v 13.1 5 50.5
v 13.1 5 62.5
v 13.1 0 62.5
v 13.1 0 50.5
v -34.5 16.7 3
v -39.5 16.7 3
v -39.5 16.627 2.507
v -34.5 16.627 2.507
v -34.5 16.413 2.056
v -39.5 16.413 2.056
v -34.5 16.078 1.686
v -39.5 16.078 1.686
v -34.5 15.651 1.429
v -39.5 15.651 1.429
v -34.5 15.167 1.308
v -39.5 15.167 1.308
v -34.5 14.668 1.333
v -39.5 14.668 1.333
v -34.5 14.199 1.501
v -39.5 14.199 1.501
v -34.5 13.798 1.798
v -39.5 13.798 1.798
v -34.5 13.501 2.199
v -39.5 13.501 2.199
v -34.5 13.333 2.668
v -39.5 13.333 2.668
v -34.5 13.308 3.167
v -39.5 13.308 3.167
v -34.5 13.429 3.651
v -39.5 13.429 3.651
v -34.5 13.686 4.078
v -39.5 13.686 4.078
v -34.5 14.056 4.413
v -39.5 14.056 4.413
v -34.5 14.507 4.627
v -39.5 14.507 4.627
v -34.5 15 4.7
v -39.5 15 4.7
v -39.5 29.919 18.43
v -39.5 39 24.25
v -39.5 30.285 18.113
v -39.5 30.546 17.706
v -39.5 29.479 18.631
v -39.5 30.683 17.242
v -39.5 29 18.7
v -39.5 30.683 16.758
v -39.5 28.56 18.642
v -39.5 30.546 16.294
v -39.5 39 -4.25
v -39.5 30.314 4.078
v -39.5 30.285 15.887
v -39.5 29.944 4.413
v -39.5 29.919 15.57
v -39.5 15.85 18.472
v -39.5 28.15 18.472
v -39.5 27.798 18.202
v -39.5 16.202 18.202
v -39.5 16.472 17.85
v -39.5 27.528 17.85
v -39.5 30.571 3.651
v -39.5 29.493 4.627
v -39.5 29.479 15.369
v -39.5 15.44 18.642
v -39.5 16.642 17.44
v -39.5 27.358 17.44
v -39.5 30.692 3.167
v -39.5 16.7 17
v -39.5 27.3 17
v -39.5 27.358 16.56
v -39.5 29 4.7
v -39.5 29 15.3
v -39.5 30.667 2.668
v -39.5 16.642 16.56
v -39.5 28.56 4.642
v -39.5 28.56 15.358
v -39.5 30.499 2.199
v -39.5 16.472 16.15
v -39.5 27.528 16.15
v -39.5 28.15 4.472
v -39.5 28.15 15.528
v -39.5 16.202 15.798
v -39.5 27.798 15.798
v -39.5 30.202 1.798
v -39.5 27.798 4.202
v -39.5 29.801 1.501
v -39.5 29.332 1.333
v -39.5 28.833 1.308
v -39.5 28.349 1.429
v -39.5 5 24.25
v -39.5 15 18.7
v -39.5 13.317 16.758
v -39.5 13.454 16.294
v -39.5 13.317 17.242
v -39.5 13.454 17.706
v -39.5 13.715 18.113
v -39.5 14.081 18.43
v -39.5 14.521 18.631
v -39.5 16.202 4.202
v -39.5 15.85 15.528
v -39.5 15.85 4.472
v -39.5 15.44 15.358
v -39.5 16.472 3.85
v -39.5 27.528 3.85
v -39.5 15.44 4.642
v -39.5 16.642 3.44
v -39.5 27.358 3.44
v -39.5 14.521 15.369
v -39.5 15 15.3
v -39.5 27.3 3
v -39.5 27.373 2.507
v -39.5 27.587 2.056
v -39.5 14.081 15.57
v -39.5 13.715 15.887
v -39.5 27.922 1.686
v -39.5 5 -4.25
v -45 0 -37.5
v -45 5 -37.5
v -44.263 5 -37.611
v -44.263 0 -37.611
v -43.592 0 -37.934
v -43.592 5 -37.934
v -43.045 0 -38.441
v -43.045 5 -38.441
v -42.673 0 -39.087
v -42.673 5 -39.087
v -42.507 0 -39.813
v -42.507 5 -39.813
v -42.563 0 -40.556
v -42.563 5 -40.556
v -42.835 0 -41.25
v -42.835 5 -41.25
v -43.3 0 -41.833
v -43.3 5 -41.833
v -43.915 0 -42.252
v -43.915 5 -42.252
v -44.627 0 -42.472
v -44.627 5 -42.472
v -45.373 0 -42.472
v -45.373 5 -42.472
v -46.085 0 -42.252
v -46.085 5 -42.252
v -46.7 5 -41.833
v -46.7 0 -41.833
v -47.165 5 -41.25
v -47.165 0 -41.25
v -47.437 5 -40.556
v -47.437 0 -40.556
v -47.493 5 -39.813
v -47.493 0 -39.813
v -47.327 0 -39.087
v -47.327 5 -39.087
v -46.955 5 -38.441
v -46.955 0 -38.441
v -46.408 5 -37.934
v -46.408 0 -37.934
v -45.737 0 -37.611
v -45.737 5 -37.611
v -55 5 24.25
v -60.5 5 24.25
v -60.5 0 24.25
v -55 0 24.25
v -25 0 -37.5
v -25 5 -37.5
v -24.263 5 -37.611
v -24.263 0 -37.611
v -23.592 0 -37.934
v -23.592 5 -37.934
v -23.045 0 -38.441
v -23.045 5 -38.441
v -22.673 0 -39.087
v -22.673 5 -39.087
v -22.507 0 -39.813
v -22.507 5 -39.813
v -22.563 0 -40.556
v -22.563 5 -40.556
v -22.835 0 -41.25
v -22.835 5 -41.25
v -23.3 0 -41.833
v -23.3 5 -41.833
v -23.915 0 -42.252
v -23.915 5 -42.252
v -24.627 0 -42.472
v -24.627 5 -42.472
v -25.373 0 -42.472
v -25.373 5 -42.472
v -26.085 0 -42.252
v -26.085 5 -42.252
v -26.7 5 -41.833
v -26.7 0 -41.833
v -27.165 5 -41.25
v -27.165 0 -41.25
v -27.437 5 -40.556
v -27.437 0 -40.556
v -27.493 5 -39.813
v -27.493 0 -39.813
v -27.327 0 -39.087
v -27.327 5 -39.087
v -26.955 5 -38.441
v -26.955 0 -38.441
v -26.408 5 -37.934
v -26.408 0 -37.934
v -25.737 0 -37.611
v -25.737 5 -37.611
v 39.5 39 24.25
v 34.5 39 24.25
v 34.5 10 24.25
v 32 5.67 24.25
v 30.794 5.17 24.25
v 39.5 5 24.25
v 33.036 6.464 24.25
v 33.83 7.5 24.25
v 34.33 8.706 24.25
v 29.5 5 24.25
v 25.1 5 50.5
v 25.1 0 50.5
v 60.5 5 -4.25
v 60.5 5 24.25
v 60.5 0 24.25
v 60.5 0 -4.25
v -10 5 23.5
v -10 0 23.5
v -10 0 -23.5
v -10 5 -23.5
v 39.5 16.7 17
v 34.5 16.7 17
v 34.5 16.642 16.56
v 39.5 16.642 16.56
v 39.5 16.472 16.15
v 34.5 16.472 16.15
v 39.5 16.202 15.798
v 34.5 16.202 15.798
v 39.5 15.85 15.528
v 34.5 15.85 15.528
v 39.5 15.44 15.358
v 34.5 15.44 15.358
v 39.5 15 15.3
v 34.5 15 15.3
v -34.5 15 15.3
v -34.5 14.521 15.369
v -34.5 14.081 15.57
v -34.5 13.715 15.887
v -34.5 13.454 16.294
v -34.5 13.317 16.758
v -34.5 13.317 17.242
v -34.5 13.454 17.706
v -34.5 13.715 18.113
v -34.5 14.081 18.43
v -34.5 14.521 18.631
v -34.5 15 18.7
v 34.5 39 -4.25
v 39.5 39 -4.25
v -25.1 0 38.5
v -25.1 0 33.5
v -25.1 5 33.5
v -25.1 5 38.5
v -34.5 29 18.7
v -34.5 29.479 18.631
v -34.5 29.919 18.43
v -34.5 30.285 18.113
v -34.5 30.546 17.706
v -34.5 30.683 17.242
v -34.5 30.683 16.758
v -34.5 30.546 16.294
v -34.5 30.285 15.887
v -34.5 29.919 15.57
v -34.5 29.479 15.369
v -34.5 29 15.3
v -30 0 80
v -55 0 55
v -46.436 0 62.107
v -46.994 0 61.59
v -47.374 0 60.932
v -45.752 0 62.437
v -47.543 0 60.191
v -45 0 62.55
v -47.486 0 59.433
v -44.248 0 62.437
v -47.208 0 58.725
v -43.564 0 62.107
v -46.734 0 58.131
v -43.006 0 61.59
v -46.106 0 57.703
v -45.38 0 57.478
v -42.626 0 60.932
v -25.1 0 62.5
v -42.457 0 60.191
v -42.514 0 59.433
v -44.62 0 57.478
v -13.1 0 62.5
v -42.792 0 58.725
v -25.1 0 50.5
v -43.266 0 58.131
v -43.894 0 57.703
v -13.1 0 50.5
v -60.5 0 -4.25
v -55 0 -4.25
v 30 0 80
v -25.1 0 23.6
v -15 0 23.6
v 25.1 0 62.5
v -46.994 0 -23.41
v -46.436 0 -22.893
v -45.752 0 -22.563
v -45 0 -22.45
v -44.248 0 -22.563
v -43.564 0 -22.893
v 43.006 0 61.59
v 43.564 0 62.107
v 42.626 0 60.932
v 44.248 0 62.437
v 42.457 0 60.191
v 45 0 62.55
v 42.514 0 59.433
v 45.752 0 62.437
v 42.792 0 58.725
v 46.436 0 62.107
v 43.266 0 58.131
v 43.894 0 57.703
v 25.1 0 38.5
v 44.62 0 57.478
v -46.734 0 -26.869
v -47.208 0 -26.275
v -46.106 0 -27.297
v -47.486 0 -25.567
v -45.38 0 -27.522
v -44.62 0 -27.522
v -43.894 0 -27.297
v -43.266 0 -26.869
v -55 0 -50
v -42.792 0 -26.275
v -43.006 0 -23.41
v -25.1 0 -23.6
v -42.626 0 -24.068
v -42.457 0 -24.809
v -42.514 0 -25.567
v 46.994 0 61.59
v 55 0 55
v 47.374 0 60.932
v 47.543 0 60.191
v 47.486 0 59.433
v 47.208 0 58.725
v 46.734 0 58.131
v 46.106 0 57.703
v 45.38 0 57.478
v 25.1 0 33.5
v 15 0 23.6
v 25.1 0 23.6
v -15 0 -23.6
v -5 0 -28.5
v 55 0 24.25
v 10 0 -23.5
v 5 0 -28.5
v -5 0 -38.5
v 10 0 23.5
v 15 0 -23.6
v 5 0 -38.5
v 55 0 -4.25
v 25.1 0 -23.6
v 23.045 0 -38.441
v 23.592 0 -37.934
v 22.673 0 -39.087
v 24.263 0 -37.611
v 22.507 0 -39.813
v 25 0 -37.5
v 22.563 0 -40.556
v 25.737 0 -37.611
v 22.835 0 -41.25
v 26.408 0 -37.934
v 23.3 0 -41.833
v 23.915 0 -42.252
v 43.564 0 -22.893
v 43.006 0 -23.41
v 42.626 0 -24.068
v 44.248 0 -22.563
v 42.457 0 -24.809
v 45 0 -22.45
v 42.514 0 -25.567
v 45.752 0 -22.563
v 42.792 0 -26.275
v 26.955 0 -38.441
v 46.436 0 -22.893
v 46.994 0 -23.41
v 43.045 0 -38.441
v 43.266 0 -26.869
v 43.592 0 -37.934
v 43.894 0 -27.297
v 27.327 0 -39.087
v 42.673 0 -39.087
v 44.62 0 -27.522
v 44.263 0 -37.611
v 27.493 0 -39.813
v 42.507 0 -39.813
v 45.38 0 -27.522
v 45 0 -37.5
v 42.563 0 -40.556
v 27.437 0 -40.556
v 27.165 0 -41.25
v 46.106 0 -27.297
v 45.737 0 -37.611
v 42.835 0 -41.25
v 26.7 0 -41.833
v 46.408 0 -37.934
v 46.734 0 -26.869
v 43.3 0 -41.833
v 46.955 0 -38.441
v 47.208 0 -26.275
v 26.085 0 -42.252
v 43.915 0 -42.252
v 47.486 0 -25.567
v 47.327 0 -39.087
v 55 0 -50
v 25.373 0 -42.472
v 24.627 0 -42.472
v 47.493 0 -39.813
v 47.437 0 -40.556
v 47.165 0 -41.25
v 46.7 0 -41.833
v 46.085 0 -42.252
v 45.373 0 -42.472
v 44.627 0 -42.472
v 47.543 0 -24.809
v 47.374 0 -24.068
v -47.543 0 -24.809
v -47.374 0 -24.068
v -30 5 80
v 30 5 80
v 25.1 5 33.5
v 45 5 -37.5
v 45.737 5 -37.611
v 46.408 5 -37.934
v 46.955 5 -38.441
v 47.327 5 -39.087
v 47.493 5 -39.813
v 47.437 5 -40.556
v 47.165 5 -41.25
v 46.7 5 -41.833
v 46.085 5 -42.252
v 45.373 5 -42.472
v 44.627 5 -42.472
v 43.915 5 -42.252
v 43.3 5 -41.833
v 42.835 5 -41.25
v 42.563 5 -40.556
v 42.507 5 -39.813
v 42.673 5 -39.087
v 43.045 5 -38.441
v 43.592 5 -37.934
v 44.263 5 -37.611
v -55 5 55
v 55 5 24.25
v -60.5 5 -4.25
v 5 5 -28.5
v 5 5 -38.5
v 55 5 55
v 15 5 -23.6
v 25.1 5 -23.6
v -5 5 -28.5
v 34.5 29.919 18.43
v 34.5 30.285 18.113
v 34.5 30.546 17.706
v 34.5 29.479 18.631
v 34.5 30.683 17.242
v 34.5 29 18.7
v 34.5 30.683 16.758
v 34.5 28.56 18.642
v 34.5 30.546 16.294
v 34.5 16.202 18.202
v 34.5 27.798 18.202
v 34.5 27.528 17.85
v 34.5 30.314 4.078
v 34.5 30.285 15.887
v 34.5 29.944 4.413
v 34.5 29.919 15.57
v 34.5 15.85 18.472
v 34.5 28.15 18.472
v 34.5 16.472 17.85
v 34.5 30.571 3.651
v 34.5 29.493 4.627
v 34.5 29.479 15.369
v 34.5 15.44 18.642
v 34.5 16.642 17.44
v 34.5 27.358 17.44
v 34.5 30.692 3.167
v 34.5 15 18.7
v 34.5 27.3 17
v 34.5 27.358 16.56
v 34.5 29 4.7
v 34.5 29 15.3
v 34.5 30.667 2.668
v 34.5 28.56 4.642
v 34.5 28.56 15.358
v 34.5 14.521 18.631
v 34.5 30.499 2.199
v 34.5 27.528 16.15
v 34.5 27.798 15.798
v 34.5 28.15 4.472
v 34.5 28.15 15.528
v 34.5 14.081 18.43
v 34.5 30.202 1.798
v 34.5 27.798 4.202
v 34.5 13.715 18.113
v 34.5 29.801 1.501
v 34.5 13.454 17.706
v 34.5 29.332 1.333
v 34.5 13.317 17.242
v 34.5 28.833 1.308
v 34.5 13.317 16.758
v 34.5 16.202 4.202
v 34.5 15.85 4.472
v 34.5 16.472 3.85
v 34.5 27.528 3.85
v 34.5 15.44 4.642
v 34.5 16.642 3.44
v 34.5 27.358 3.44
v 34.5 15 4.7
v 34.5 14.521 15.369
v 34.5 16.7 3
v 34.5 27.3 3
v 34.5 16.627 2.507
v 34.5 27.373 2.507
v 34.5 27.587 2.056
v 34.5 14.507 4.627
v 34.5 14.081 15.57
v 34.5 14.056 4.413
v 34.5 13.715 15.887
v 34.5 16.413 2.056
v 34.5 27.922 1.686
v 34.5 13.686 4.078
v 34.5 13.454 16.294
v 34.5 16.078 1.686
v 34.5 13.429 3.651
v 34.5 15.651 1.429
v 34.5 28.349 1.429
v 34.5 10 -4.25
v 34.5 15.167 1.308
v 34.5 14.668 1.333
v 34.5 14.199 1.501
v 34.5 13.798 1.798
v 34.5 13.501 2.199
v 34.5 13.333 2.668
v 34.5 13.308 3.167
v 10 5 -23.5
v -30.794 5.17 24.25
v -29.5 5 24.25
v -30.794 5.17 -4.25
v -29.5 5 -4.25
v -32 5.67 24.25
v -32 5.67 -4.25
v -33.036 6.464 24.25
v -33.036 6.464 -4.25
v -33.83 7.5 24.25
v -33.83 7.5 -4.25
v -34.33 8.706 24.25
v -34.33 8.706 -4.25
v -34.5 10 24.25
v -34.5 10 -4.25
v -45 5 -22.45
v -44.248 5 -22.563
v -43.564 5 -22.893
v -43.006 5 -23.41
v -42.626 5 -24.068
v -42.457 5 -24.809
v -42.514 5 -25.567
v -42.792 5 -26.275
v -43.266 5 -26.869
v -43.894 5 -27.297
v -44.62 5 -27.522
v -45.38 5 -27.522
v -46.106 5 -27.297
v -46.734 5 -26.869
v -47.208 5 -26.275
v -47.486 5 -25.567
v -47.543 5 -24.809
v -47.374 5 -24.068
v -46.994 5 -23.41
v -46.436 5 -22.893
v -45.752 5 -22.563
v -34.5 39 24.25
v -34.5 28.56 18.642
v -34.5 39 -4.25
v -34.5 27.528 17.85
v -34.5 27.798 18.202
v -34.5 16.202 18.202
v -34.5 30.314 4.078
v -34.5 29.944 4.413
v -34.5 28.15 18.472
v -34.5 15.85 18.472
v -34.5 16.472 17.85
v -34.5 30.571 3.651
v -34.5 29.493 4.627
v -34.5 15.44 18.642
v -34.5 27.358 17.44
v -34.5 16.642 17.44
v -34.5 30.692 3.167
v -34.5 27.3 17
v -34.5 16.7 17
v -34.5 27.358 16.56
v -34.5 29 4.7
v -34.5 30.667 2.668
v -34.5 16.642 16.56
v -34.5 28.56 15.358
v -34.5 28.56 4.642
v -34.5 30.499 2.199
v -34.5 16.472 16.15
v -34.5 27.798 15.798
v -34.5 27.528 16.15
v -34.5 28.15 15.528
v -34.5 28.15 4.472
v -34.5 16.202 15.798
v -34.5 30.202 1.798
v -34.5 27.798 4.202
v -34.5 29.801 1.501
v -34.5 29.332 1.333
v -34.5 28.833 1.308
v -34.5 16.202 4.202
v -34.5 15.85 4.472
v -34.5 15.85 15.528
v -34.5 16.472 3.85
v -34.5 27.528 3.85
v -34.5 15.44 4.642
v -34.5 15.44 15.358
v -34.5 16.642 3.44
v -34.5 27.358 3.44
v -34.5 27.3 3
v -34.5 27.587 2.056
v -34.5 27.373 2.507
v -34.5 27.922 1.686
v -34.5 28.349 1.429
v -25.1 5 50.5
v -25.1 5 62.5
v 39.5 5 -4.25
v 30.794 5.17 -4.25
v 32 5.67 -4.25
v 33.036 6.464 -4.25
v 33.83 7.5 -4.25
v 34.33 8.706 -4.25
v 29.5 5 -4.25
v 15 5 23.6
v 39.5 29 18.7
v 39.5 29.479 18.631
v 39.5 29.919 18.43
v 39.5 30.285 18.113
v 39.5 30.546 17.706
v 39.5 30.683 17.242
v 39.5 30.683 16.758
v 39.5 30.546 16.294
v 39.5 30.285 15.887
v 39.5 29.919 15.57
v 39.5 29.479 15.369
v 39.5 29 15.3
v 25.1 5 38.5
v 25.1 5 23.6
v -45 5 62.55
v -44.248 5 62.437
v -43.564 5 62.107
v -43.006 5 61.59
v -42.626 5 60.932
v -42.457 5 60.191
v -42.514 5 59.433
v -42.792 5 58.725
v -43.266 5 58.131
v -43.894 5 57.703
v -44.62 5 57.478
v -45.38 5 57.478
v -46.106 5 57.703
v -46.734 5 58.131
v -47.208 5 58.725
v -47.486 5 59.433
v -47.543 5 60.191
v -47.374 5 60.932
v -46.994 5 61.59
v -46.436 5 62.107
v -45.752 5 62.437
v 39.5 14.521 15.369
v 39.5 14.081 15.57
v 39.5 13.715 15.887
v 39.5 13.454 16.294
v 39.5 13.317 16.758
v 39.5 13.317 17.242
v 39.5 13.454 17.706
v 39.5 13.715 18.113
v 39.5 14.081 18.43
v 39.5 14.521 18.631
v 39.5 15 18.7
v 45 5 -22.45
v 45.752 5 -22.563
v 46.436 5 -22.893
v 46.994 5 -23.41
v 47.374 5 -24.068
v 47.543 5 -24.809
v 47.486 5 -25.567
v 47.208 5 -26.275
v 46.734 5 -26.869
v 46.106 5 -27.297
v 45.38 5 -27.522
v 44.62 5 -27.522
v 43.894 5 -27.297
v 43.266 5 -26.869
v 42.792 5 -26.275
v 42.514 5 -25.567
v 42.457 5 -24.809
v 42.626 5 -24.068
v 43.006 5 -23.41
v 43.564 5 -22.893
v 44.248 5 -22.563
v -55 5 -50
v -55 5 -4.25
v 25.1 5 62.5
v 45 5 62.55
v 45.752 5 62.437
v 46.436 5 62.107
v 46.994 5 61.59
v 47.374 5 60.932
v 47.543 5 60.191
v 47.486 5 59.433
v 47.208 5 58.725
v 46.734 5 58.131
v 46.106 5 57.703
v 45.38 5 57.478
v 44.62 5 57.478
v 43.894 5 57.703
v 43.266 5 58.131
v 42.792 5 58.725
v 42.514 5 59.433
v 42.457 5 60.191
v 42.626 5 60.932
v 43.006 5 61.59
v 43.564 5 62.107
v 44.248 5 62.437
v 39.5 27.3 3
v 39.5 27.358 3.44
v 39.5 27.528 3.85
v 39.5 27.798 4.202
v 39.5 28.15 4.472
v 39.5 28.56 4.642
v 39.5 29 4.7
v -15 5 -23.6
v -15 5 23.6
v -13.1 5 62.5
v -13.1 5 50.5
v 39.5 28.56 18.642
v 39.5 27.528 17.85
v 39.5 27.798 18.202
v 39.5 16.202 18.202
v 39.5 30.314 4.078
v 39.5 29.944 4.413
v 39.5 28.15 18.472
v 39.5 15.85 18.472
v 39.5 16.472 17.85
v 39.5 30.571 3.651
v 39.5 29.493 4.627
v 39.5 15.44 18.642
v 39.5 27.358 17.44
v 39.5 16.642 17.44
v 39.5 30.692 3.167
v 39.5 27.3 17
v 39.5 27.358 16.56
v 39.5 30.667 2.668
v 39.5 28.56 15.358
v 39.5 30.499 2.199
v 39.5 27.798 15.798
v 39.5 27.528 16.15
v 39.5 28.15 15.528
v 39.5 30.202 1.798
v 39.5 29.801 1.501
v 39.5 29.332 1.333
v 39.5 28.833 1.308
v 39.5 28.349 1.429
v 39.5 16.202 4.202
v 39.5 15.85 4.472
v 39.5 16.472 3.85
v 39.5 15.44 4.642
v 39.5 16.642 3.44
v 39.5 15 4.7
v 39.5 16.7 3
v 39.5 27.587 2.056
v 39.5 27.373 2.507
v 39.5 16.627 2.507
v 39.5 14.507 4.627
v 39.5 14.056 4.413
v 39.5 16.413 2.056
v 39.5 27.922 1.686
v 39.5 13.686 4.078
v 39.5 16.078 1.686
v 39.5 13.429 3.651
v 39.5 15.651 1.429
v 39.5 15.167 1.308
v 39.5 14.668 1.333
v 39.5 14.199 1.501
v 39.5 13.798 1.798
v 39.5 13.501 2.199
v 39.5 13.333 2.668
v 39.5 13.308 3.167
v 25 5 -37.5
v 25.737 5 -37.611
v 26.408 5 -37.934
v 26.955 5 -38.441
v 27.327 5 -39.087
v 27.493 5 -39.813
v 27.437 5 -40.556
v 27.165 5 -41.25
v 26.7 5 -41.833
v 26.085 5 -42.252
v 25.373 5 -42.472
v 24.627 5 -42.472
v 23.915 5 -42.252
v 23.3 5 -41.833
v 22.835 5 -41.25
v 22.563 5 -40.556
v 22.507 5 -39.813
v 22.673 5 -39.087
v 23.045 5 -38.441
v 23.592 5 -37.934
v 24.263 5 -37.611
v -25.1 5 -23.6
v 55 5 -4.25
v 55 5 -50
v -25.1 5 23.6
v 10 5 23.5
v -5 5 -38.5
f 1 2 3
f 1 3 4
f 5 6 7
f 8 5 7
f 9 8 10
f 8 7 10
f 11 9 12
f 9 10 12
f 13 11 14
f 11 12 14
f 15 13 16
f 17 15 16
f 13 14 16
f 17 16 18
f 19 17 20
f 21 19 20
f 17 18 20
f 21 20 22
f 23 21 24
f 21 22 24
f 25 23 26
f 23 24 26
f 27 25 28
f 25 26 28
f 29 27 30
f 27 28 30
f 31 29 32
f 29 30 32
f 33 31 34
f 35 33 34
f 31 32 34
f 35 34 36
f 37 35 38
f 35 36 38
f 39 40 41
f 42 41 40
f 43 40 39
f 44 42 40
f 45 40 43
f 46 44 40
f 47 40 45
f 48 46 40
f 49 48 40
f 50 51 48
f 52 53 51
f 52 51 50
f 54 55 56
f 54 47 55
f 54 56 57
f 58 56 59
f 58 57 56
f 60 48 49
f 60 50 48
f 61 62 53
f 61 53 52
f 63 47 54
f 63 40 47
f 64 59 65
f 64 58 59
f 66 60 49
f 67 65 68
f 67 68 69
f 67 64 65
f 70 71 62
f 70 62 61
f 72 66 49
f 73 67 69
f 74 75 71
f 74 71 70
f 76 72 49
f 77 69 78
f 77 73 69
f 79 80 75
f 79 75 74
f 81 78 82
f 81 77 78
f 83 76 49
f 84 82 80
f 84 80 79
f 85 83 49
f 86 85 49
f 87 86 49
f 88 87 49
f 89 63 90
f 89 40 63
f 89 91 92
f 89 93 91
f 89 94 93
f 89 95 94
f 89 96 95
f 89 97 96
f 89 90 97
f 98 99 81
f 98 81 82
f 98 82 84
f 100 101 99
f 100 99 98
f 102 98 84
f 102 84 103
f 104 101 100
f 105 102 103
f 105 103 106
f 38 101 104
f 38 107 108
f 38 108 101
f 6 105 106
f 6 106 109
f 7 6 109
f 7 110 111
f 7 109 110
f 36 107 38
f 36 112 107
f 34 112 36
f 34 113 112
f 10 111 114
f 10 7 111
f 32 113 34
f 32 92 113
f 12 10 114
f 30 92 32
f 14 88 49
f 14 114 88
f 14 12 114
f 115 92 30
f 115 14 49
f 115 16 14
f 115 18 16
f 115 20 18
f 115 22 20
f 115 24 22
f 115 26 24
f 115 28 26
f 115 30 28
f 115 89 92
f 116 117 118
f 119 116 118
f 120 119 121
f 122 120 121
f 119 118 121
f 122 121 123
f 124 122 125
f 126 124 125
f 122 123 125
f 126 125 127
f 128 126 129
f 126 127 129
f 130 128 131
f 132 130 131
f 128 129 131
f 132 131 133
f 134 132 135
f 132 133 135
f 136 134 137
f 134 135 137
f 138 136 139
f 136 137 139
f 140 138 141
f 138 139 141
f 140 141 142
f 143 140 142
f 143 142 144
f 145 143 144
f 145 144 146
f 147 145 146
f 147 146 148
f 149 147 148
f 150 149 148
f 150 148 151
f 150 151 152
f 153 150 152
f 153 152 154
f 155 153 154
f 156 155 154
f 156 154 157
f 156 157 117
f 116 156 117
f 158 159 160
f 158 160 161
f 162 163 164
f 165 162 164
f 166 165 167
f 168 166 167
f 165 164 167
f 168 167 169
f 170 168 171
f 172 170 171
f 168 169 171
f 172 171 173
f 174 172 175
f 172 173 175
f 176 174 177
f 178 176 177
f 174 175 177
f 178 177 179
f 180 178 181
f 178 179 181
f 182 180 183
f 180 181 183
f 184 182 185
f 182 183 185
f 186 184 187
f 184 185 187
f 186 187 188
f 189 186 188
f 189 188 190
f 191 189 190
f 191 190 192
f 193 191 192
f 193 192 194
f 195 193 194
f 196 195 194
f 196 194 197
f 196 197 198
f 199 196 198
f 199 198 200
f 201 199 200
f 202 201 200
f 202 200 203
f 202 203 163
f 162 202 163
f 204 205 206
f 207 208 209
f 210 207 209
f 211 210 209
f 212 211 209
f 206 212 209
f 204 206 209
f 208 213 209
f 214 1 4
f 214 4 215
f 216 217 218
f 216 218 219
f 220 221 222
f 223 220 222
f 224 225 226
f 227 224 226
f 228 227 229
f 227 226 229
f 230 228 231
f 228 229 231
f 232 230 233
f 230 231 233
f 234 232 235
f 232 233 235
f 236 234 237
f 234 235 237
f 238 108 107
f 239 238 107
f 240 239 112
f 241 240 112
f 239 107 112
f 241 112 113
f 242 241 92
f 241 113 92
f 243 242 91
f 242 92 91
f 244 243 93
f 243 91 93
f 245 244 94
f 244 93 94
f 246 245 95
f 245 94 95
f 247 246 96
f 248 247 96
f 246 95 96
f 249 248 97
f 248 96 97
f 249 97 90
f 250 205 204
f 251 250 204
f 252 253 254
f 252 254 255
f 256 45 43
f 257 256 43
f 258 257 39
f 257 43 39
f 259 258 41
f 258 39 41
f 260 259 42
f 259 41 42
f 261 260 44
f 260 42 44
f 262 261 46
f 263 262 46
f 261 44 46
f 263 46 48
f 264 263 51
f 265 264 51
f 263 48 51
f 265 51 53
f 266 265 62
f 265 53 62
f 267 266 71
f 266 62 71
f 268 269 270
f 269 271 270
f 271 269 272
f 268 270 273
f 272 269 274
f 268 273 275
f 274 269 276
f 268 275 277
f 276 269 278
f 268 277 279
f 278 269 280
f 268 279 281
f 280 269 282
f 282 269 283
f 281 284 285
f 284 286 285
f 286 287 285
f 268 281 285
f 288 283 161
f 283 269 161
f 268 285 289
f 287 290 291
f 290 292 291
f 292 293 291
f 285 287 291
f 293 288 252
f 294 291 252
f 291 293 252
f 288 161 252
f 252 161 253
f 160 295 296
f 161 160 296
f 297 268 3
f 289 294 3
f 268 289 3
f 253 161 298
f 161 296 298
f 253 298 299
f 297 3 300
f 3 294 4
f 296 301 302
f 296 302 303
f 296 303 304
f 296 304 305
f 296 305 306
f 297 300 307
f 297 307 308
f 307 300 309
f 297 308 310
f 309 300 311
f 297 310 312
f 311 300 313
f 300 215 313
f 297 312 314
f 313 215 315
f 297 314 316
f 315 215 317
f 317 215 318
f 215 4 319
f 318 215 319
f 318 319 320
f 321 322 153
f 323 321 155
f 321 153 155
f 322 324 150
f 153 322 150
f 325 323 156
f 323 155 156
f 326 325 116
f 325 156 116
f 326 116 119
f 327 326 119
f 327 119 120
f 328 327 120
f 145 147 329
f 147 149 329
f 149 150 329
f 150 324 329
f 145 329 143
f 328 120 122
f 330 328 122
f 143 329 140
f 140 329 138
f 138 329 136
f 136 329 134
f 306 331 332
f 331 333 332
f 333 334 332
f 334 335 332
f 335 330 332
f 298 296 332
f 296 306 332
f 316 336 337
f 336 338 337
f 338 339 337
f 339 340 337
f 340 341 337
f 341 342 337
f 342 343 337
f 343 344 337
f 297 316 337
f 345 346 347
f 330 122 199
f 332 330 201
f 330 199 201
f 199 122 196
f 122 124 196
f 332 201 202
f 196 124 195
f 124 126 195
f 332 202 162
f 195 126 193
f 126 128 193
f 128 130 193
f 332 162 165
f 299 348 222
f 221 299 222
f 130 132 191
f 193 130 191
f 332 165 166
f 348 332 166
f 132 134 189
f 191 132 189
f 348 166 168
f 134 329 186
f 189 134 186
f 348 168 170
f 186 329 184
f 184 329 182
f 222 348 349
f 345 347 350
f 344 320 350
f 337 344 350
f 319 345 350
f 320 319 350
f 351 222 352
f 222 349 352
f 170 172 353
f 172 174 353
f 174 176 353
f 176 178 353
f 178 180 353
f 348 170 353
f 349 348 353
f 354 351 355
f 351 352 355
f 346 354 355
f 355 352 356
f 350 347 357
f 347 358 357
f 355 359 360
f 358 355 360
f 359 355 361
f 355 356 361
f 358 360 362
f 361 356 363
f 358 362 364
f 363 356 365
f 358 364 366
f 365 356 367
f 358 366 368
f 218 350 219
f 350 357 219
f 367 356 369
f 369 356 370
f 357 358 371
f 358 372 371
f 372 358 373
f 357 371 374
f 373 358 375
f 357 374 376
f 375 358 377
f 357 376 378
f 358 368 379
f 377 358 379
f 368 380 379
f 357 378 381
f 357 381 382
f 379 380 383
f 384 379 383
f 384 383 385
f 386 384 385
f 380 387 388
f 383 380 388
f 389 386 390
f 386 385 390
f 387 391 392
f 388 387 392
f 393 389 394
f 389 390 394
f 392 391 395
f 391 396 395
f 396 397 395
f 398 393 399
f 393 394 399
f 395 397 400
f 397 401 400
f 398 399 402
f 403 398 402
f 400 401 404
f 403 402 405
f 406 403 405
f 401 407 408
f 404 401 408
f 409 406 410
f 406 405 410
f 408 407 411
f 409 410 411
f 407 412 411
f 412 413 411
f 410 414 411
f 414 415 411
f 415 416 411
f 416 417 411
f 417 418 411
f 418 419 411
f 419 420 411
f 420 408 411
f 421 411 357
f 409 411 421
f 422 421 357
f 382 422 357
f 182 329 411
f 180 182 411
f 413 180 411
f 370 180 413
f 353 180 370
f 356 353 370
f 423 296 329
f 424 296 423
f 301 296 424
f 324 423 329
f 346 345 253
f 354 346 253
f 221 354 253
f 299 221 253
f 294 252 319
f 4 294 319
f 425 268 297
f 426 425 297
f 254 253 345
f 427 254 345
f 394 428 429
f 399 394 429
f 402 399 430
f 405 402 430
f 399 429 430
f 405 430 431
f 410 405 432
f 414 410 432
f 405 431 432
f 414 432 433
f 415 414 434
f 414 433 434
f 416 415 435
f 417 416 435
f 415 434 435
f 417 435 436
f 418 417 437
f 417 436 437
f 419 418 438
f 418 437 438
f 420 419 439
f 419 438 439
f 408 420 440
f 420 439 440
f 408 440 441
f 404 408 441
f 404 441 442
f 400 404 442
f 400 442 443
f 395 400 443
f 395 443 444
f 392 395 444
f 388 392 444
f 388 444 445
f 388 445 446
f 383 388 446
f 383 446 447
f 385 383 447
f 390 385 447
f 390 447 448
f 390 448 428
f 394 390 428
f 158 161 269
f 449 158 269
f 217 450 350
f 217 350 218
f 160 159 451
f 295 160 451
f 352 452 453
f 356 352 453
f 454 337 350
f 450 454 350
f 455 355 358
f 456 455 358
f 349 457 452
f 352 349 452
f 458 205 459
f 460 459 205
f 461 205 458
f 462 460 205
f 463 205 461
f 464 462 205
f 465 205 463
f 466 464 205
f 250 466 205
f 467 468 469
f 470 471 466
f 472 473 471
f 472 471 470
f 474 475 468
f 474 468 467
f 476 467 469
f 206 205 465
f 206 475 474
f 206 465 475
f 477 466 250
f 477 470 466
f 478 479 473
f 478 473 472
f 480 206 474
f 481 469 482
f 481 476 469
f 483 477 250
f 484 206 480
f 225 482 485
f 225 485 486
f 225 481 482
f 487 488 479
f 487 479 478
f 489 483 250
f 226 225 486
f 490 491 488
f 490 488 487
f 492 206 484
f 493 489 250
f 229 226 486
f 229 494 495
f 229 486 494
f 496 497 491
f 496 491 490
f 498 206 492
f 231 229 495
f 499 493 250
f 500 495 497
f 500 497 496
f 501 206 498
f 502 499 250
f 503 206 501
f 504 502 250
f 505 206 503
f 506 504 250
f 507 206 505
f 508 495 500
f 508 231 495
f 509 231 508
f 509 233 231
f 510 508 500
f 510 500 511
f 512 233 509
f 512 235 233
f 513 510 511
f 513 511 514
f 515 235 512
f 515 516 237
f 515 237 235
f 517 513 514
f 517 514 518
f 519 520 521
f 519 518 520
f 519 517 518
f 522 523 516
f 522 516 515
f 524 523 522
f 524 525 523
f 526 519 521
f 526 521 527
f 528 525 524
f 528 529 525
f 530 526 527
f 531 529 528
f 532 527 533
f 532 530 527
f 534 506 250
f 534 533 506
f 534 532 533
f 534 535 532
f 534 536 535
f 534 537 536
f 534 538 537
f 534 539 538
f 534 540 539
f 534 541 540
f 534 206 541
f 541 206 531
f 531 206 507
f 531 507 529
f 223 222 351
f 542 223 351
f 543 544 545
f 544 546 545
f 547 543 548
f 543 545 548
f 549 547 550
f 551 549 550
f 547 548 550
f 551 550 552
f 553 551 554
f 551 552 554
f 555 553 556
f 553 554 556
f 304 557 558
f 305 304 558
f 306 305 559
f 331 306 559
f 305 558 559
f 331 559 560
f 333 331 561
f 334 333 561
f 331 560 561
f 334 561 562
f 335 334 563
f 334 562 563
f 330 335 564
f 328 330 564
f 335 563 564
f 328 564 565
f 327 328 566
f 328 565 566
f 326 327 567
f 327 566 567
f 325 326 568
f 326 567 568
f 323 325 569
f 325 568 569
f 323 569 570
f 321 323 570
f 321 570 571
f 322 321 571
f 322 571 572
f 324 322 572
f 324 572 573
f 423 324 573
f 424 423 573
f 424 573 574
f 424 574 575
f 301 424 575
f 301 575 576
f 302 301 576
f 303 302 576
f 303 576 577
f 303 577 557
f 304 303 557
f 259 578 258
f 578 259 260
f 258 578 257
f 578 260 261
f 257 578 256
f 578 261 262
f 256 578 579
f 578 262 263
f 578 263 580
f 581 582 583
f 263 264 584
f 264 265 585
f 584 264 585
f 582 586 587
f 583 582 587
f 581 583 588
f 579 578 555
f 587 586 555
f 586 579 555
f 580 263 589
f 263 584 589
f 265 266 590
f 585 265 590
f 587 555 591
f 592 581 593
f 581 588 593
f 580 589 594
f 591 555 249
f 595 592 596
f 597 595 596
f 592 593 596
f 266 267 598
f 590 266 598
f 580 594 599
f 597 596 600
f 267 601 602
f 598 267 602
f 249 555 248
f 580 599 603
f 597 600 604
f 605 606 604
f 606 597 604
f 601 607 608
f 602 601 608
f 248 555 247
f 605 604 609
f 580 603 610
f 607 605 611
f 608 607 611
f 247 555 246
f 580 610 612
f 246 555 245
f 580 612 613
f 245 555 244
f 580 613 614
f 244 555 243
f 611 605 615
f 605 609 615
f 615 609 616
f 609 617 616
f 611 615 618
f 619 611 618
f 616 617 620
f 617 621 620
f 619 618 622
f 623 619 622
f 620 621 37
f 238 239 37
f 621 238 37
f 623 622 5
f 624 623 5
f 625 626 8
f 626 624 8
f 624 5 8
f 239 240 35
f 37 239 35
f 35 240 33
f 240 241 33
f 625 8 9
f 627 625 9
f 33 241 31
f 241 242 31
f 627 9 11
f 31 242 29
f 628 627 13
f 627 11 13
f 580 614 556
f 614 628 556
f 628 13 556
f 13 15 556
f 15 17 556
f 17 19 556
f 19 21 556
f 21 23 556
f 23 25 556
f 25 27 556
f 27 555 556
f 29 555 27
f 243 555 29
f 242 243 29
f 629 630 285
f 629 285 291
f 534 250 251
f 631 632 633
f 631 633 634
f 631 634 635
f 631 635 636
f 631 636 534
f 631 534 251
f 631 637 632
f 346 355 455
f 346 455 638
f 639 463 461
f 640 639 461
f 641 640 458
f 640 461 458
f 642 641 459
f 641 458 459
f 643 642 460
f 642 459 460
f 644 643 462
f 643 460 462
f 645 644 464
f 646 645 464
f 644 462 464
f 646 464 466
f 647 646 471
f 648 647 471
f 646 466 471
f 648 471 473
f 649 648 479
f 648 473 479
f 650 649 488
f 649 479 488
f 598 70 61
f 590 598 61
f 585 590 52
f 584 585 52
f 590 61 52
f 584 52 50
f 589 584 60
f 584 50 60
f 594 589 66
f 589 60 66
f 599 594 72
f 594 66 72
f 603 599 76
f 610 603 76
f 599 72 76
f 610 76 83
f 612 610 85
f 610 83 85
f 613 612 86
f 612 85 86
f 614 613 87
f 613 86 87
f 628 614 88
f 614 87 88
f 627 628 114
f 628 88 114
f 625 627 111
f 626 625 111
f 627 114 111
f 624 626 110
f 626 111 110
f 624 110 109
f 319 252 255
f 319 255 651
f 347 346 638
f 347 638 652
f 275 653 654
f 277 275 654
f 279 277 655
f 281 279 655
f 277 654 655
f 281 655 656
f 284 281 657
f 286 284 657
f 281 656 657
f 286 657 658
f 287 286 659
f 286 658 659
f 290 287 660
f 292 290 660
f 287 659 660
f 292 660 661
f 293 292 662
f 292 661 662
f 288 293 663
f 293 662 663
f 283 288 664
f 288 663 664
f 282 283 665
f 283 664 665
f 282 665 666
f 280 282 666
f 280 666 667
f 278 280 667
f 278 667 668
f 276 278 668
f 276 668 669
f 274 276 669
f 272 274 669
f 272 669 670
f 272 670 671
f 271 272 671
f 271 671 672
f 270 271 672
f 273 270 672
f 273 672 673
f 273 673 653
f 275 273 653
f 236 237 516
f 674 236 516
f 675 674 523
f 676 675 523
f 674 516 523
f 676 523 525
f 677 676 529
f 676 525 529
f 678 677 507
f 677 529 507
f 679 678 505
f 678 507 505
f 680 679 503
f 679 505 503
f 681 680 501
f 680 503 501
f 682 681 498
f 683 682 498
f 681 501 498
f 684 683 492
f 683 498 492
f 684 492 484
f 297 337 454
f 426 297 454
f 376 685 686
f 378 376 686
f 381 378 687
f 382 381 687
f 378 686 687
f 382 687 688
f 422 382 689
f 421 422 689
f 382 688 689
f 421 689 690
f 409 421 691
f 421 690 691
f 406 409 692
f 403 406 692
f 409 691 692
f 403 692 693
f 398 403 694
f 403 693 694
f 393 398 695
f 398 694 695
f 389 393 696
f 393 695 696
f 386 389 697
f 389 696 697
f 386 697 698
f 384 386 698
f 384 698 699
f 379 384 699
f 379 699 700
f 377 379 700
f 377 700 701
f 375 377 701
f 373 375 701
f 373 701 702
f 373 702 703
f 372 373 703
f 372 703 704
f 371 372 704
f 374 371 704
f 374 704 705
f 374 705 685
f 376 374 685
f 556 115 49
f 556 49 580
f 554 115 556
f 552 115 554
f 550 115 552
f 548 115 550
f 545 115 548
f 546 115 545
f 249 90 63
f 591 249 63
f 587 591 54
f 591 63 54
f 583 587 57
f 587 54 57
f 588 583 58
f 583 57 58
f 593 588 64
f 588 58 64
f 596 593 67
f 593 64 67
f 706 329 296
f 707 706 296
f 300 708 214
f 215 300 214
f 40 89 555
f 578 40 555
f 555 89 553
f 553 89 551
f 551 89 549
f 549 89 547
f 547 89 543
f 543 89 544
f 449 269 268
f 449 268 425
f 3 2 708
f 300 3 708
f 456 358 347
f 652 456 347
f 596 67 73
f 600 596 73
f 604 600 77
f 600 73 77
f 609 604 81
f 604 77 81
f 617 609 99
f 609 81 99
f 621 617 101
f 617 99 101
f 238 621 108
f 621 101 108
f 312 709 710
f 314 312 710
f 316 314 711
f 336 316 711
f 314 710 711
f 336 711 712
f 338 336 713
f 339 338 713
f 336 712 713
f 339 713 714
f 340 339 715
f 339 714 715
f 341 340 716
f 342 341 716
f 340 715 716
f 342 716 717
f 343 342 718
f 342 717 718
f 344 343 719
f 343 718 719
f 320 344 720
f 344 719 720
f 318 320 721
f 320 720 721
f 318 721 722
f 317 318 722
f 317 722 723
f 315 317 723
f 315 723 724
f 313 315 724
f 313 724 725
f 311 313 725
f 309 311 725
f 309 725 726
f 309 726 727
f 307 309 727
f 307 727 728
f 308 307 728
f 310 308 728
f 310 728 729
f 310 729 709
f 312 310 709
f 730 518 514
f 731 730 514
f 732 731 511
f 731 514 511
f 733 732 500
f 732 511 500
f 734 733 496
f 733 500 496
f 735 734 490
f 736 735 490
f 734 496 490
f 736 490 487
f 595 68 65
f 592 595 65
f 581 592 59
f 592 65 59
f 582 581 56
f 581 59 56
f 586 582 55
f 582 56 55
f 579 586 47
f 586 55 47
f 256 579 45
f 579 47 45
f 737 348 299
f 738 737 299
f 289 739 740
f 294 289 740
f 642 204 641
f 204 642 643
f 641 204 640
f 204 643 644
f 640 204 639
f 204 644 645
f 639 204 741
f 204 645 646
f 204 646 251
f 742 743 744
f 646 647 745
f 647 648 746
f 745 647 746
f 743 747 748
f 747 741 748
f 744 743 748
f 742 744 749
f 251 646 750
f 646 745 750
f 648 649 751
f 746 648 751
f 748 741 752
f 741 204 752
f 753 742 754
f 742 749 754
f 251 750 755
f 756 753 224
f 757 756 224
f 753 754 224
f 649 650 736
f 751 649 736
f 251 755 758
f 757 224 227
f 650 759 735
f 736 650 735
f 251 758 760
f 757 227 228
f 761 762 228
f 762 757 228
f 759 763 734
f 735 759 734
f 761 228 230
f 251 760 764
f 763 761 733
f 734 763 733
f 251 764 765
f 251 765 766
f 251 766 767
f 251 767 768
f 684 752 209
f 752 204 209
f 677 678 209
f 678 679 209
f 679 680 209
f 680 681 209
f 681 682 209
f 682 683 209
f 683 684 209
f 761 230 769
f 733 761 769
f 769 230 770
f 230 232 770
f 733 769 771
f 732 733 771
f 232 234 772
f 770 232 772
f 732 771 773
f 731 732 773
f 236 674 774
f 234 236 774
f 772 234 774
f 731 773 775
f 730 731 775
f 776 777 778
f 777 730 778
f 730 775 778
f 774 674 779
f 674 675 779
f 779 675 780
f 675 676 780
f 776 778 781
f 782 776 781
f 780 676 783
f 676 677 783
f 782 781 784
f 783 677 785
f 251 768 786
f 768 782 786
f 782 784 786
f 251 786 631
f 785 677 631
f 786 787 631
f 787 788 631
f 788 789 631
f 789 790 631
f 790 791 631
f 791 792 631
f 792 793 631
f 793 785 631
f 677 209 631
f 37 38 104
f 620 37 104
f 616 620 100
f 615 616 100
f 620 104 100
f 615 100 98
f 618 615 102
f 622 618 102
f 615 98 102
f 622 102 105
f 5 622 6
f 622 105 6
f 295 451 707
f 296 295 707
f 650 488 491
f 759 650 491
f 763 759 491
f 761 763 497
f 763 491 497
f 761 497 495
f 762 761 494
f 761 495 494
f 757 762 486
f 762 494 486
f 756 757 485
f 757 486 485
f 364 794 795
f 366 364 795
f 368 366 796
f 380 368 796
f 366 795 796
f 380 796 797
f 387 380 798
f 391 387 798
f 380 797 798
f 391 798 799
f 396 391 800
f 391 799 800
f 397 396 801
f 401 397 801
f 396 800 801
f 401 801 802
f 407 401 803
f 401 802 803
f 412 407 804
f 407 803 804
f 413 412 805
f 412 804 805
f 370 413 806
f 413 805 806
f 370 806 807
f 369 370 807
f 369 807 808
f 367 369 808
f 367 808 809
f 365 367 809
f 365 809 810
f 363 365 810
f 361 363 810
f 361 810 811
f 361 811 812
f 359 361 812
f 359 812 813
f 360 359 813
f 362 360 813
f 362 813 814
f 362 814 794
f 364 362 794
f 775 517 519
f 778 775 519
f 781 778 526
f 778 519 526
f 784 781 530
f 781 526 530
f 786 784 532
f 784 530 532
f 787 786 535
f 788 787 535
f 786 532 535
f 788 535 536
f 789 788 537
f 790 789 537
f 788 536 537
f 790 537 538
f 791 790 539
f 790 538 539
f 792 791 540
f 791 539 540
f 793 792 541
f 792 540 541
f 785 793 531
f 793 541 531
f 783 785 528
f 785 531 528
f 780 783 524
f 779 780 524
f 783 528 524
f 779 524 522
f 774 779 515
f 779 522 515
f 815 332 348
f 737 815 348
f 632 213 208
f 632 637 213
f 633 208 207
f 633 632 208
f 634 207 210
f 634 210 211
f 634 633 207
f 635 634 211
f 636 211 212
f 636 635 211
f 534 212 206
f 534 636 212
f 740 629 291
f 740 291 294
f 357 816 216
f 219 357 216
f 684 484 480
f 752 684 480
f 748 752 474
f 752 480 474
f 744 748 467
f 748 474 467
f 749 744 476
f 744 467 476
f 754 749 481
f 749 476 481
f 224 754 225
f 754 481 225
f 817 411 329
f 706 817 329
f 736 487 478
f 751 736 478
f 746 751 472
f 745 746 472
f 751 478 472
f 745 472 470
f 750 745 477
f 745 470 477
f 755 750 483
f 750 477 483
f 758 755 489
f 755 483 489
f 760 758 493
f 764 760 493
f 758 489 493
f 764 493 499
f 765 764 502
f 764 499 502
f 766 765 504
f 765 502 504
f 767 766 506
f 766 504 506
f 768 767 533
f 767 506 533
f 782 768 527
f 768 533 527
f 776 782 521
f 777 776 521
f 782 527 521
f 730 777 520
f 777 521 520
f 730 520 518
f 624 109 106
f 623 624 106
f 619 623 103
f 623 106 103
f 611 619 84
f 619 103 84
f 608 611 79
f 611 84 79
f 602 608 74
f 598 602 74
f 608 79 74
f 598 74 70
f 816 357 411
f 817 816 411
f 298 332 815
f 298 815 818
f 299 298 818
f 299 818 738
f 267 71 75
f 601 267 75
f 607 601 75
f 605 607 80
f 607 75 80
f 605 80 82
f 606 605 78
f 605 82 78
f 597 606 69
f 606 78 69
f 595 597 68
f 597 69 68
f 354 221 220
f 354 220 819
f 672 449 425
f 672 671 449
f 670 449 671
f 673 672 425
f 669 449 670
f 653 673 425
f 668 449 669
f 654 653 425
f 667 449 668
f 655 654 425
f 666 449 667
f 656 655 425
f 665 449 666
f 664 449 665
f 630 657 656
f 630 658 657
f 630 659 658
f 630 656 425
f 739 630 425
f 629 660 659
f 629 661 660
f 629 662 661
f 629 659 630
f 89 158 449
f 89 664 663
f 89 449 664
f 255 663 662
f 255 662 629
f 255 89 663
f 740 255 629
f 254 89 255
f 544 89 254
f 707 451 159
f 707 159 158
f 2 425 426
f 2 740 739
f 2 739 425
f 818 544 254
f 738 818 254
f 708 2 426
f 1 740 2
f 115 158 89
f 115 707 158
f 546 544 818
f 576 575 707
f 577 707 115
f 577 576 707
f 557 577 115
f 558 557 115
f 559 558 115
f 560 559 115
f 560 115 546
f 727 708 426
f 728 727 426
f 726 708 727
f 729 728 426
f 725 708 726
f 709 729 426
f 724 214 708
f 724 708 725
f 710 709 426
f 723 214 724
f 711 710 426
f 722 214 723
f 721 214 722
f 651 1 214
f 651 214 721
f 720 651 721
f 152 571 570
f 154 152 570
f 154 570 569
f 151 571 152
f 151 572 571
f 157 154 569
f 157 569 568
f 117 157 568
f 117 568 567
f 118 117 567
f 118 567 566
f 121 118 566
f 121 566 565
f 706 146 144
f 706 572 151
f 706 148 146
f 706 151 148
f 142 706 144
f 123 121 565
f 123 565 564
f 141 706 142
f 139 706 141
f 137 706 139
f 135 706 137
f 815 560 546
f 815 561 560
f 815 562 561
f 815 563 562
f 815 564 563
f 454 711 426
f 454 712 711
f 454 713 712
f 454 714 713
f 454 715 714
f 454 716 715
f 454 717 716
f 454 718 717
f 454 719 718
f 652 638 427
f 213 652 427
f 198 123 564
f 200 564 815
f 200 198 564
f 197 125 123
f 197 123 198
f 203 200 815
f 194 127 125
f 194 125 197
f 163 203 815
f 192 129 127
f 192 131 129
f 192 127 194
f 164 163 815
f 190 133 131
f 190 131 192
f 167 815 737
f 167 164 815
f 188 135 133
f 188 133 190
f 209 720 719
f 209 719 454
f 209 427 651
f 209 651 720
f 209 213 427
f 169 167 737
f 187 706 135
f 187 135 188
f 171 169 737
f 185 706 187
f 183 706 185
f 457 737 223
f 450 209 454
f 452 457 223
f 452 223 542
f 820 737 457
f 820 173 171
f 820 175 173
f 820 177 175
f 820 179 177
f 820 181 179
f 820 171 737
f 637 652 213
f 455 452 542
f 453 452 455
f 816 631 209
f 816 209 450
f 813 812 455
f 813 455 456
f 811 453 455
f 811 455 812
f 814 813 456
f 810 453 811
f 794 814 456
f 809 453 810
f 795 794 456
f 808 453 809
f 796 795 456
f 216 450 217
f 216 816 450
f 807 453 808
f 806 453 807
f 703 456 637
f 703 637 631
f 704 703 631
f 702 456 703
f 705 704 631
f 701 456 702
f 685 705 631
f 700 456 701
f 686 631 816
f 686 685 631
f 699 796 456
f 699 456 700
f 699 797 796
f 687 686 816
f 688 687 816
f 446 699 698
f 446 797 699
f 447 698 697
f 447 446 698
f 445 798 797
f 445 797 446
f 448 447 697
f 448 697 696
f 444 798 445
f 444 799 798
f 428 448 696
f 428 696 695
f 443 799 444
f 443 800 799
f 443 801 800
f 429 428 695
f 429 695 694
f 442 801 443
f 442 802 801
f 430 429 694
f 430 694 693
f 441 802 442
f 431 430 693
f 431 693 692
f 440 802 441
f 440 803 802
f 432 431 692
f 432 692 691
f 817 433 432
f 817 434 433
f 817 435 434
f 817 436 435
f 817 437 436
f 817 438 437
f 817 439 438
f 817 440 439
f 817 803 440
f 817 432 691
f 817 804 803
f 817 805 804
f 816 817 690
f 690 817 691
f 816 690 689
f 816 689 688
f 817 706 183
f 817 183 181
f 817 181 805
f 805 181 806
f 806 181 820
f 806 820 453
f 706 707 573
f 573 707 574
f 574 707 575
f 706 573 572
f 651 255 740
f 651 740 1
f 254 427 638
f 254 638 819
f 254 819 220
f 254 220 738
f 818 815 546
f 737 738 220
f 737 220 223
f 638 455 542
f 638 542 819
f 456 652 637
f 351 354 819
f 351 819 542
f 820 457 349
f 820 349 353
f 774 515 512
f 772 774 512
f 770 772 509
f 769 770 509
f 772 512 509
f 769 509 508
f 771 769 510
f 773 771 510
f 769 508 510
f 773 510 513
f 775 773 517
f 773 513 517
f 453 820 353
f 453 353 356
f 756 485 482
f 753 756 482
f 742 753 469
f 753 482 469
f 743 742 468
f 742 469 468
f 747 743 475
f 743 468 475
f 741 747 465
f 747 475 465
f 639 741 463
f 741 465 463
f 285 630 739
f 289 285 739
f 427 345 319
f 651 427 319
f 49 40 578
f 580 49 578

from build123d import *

# Parameters (mm, degrees)
SKETCH1_W           = 20
SKETCH1_H           = 47
BOSS_EXTRUDE3_DEPTH = 5
SKETCH2_W           = 10.1
SKETCH2_H           = 47.2
SKETCH2_W_2         = 50.2
SKETCH2_H_2         = 5
CUT_EXTRUDE1_DEPTH  = 15
SKETCH3_R           = 2.55
CUT_EXTRUDE3_DEPTH  = 10
SKETCH4_W           = 5
SKETCH4_H           = 28.5
BOSS_EXTRUDE4_DEPTH = 34
CUT_EXTRUDE4_DEPTH  = 130.812364588
FILLET1_R           = 5
SKETCH6_W           = 5.5
SKETCH6_H           = 28.5
BOSS_EXTRUDE5_DEPTH = 5
SKETCH9_R           = 2.5
CUT_EXTRUDE7_DEPTH  = 180
CHAMFER1_SIZE       = 25
SKETCH10_W          = 10
SKETCH10_H          = 10
SKETCH10_W_2        = 12
SKETCH10_H_2        = 12
CUT_EXTRUDE8_DEPTH  = 106.906798649


with BuildPart() as part:
    # Sketch1 → Boss-Extrude3 (new body)
    with BuildSketch(Plane(origin=(0, 0, 0), x_dir=(1, 0, 0), z_dir=(0, 1, 0))):
        Polygon((55, 50), (-55, 50), (-55, 21.75), (-55, -21.75), (-55, -80), (-20, -80), (2.5, -80), (20, -80), (42.5, -80), (55, -80), (55, -21.75), (55, 21.75), align=None)
        Rectangle(SKETCH1_W, SKETCH1_H, mode=Mode.SUBTRACT)
    extrude(amount=BOSS_EXTRUDE3_DEPTH)

    # Sketch2 → Cut-Extrude1 (cut)
    with BuildSketch(Plane.XZ):
        with Locations((-20.05, 0)):
            Rectangle(SKETCH2_W, SKETCH2_H)
        with Locations((20.05, 0)):
            Rectangle(SKETCH2_W, SKETCH2_H)
        with Locations((0, 36)):
            Rectangle(SKETCH2_W_2, SKETCH2_H_2)
    extrude(amount=-CUT_EXTRUDE1_DEPTH, mode=Mode.SUBTRACT)

    # Sketch3 → Cut-Extrude3 (cut)
    with BuildSketch(Plane(origin=(0, 5, 0), x_dir=(1, 0, 0), z_dir=(0, 1, 0))):
        with Locations(Location((-45, 25, 0), (0, 0, 270))):
            Circle(SKETCH3_R)
        with Locations(Location((-45, -60, 0), (0, 0, 270))):
            Circle(SKETCH3_R)
        with Locations(Location((45, -60, 0), (0, 0, 270))):
            Circle(SKETCH3_R)
        with Locations(Location((45, 25, 0), (0, 0, 270))):
            Circle(SKETCH3_R)
    extrude(amount=-CUT_EXTRUDE3_DEPTH, mode=Mode.SUBTRACT)

    # Sketch4 → Boss-Extrude4 (add)
    with BuildSketch(Plane(origin=(0, 5, 0), x_dir=(1, 0, 0), z_dir=(0, 1, 0))):
        with Locations((-37, -10)):
            Rectangle(SKETCH4_W, SKETCH4_H)
        with Locations((37, -10)):
            Rectangle(SKETCH4_W, SKETCH4_H)
    extrude(amount=BOSS_EXTRUDE4_DEPTH)

    # Sketch5 → Cut-Extrude4 (cut, through all)
    with BuildSketch(Plane.ZY.offset(39.5)):
        with BuildLine():
            ThreePointArc((4.7, 15), (4.202081528, 16.202081528), (3, 16.7))
            Line((3, 16.7), (3, 15))
            Line((3, 15), (4.7, 15))
        make_face()
        with BuildLine():
            Line((3, 15), (3, 16.7))
            ThreePointArc((3, 16.7), (1.797918472, 13.797918472), (4.7, 15))
            Line((4.7, 15), (3, 15))
        make_face()
        with BuildLine():
            Line((3, 27.3), (3, 29))
            Line((3, 29), (4.7, 29))
            ThreePointArc((4.7, 29), (1.797918472, 30.202081528), (3, 27.3))
        make_face()
        with BuildLine():
            Line((4.7, 29), (3, 29))
            Line((3, 29), (3, 27.3))
            ThreePointArc((3, 27.3), (4.202081528, 27.797918472), (4.7, 29))
        make_face()
        with BuildLine():
            ThreePointArc((18.7, 29), (17, 30.7), (15.3, 29))
            Line((15.3, 29), (17, 29))
            Line((17, 29), (17, 27.3))
            ThreePointArc((17, 27.3), (18.202081528, 27.797918472), (18.7, 29))
        make_face()
        with BuildLine():
            Line((17, 29), (15.3, 29))
            ThreePointArc((15.3, 29), (15.797918472, 27.797918472), (17, 27.3))
            Line((17, 27.3), (17, 29))
        make_face()
        with BuildLine():
            ThreePointArc((18.7, 15), (18.202081528, 16.202081528), (17, 16.7))
            Line((17, 16.7), (17, 15))
            Line((17, 15), (15.3, 15))
            ThreePointArc((15.3, 15), (17, 13.3), (18.7, 15))
        make_face()
        with BuildLine():
            Line((17, 15), (17, 16.7))
            ThreePointArc((17, 16.7), (15.797918472, 16.202081528), (15.3, 15))
            Line((15.3, 15), (17, 15))
        make_face()
    extrude(amount=-CUT_EXTRUDE4_DEPTH, mode=Mode.SUBTRACT)

    # Fillet1
    fillet1_edges = [part.edges().sort_by_distance(p)[0] for p in [
        (-34.5, 5, 10),
        (34.5, 5, 10),
    ]]
    fillet(fillet1_edges, radius=FILLET1_R)

    # Sketch6 → Boss-Extrude5 (add)
    with BuildSketch(Plane(origin=(0, 5, 0), x_dir=(1, 0, 0), z_dir=(0, 1, 0))):
        with Locations((-57.75, -10)):
            Rectangle(SKETCH6_W, SKETCH6_H)
        with Locations((57.75, -10)):
            Rectangle(SKETCH6_W, SKETCH6_H)
    extrude(amount=-BOSS_EXTRUDE5_DEPTH)

    # Sketch9 → Cut-Extrude7 (cut)
    with BuildSketch(Plane(origin=(0, 5, 0), x_dir=(1, 0, 0), z_dir=(0, 1, 0))):
        with Locations(Location((-45, 40, 0), (0, 0, 270))):
            Circle(SKETCH9_R)
        with Locations(Location((45, 40, 0), (0, 0, 270))):
            Circle(SKETCH9_R)
        with Locations(Location((-25, 40, 0), (0, 0, 270))):
            Circle(SKETCH9_R)
        with Locations(Location((25, 40, 0), (0, 0, 270))):
            Circle(SKETCH9_R)
    extrude(amount=-CUT_EXTRUDE7_DEPTH, mode=Mode.SUBTRACT)

    # Chamfer1
    chamfer1_edges = [part.edges().sort_by_distance(p)[0] for p in [
        (55, 2.5, 80),
        (-55, 2.5, 80),
    ]]
    chamfer(chamfer1_edges, length=CHAMFER1_SIZE)

    # Sketch10 → Cut-Extrude8 (cut, through all)
    with BuildSketch(Plane(origin=(0, 5, 0), x_dir=(1, 0, 0), z_dir=(0, 1, 0))):
        with Locations((0, 33.5)):
            Rectangle(SKETCH10_W, SKETCH10_H)
        with Locations((-19.1, -56.5)):
            Rectangle(SKETCH10_W_2, SKETCH10_H_2)
        with Locations((19.1, -56.5)):
            Rectangle(SKETCH10_W_2, SKETCH10_H_2)
    extrude(amount=-CUT_EXTRUDE8_DEPTH, mode=Mode.SUBTRACT)


solid = part.part
